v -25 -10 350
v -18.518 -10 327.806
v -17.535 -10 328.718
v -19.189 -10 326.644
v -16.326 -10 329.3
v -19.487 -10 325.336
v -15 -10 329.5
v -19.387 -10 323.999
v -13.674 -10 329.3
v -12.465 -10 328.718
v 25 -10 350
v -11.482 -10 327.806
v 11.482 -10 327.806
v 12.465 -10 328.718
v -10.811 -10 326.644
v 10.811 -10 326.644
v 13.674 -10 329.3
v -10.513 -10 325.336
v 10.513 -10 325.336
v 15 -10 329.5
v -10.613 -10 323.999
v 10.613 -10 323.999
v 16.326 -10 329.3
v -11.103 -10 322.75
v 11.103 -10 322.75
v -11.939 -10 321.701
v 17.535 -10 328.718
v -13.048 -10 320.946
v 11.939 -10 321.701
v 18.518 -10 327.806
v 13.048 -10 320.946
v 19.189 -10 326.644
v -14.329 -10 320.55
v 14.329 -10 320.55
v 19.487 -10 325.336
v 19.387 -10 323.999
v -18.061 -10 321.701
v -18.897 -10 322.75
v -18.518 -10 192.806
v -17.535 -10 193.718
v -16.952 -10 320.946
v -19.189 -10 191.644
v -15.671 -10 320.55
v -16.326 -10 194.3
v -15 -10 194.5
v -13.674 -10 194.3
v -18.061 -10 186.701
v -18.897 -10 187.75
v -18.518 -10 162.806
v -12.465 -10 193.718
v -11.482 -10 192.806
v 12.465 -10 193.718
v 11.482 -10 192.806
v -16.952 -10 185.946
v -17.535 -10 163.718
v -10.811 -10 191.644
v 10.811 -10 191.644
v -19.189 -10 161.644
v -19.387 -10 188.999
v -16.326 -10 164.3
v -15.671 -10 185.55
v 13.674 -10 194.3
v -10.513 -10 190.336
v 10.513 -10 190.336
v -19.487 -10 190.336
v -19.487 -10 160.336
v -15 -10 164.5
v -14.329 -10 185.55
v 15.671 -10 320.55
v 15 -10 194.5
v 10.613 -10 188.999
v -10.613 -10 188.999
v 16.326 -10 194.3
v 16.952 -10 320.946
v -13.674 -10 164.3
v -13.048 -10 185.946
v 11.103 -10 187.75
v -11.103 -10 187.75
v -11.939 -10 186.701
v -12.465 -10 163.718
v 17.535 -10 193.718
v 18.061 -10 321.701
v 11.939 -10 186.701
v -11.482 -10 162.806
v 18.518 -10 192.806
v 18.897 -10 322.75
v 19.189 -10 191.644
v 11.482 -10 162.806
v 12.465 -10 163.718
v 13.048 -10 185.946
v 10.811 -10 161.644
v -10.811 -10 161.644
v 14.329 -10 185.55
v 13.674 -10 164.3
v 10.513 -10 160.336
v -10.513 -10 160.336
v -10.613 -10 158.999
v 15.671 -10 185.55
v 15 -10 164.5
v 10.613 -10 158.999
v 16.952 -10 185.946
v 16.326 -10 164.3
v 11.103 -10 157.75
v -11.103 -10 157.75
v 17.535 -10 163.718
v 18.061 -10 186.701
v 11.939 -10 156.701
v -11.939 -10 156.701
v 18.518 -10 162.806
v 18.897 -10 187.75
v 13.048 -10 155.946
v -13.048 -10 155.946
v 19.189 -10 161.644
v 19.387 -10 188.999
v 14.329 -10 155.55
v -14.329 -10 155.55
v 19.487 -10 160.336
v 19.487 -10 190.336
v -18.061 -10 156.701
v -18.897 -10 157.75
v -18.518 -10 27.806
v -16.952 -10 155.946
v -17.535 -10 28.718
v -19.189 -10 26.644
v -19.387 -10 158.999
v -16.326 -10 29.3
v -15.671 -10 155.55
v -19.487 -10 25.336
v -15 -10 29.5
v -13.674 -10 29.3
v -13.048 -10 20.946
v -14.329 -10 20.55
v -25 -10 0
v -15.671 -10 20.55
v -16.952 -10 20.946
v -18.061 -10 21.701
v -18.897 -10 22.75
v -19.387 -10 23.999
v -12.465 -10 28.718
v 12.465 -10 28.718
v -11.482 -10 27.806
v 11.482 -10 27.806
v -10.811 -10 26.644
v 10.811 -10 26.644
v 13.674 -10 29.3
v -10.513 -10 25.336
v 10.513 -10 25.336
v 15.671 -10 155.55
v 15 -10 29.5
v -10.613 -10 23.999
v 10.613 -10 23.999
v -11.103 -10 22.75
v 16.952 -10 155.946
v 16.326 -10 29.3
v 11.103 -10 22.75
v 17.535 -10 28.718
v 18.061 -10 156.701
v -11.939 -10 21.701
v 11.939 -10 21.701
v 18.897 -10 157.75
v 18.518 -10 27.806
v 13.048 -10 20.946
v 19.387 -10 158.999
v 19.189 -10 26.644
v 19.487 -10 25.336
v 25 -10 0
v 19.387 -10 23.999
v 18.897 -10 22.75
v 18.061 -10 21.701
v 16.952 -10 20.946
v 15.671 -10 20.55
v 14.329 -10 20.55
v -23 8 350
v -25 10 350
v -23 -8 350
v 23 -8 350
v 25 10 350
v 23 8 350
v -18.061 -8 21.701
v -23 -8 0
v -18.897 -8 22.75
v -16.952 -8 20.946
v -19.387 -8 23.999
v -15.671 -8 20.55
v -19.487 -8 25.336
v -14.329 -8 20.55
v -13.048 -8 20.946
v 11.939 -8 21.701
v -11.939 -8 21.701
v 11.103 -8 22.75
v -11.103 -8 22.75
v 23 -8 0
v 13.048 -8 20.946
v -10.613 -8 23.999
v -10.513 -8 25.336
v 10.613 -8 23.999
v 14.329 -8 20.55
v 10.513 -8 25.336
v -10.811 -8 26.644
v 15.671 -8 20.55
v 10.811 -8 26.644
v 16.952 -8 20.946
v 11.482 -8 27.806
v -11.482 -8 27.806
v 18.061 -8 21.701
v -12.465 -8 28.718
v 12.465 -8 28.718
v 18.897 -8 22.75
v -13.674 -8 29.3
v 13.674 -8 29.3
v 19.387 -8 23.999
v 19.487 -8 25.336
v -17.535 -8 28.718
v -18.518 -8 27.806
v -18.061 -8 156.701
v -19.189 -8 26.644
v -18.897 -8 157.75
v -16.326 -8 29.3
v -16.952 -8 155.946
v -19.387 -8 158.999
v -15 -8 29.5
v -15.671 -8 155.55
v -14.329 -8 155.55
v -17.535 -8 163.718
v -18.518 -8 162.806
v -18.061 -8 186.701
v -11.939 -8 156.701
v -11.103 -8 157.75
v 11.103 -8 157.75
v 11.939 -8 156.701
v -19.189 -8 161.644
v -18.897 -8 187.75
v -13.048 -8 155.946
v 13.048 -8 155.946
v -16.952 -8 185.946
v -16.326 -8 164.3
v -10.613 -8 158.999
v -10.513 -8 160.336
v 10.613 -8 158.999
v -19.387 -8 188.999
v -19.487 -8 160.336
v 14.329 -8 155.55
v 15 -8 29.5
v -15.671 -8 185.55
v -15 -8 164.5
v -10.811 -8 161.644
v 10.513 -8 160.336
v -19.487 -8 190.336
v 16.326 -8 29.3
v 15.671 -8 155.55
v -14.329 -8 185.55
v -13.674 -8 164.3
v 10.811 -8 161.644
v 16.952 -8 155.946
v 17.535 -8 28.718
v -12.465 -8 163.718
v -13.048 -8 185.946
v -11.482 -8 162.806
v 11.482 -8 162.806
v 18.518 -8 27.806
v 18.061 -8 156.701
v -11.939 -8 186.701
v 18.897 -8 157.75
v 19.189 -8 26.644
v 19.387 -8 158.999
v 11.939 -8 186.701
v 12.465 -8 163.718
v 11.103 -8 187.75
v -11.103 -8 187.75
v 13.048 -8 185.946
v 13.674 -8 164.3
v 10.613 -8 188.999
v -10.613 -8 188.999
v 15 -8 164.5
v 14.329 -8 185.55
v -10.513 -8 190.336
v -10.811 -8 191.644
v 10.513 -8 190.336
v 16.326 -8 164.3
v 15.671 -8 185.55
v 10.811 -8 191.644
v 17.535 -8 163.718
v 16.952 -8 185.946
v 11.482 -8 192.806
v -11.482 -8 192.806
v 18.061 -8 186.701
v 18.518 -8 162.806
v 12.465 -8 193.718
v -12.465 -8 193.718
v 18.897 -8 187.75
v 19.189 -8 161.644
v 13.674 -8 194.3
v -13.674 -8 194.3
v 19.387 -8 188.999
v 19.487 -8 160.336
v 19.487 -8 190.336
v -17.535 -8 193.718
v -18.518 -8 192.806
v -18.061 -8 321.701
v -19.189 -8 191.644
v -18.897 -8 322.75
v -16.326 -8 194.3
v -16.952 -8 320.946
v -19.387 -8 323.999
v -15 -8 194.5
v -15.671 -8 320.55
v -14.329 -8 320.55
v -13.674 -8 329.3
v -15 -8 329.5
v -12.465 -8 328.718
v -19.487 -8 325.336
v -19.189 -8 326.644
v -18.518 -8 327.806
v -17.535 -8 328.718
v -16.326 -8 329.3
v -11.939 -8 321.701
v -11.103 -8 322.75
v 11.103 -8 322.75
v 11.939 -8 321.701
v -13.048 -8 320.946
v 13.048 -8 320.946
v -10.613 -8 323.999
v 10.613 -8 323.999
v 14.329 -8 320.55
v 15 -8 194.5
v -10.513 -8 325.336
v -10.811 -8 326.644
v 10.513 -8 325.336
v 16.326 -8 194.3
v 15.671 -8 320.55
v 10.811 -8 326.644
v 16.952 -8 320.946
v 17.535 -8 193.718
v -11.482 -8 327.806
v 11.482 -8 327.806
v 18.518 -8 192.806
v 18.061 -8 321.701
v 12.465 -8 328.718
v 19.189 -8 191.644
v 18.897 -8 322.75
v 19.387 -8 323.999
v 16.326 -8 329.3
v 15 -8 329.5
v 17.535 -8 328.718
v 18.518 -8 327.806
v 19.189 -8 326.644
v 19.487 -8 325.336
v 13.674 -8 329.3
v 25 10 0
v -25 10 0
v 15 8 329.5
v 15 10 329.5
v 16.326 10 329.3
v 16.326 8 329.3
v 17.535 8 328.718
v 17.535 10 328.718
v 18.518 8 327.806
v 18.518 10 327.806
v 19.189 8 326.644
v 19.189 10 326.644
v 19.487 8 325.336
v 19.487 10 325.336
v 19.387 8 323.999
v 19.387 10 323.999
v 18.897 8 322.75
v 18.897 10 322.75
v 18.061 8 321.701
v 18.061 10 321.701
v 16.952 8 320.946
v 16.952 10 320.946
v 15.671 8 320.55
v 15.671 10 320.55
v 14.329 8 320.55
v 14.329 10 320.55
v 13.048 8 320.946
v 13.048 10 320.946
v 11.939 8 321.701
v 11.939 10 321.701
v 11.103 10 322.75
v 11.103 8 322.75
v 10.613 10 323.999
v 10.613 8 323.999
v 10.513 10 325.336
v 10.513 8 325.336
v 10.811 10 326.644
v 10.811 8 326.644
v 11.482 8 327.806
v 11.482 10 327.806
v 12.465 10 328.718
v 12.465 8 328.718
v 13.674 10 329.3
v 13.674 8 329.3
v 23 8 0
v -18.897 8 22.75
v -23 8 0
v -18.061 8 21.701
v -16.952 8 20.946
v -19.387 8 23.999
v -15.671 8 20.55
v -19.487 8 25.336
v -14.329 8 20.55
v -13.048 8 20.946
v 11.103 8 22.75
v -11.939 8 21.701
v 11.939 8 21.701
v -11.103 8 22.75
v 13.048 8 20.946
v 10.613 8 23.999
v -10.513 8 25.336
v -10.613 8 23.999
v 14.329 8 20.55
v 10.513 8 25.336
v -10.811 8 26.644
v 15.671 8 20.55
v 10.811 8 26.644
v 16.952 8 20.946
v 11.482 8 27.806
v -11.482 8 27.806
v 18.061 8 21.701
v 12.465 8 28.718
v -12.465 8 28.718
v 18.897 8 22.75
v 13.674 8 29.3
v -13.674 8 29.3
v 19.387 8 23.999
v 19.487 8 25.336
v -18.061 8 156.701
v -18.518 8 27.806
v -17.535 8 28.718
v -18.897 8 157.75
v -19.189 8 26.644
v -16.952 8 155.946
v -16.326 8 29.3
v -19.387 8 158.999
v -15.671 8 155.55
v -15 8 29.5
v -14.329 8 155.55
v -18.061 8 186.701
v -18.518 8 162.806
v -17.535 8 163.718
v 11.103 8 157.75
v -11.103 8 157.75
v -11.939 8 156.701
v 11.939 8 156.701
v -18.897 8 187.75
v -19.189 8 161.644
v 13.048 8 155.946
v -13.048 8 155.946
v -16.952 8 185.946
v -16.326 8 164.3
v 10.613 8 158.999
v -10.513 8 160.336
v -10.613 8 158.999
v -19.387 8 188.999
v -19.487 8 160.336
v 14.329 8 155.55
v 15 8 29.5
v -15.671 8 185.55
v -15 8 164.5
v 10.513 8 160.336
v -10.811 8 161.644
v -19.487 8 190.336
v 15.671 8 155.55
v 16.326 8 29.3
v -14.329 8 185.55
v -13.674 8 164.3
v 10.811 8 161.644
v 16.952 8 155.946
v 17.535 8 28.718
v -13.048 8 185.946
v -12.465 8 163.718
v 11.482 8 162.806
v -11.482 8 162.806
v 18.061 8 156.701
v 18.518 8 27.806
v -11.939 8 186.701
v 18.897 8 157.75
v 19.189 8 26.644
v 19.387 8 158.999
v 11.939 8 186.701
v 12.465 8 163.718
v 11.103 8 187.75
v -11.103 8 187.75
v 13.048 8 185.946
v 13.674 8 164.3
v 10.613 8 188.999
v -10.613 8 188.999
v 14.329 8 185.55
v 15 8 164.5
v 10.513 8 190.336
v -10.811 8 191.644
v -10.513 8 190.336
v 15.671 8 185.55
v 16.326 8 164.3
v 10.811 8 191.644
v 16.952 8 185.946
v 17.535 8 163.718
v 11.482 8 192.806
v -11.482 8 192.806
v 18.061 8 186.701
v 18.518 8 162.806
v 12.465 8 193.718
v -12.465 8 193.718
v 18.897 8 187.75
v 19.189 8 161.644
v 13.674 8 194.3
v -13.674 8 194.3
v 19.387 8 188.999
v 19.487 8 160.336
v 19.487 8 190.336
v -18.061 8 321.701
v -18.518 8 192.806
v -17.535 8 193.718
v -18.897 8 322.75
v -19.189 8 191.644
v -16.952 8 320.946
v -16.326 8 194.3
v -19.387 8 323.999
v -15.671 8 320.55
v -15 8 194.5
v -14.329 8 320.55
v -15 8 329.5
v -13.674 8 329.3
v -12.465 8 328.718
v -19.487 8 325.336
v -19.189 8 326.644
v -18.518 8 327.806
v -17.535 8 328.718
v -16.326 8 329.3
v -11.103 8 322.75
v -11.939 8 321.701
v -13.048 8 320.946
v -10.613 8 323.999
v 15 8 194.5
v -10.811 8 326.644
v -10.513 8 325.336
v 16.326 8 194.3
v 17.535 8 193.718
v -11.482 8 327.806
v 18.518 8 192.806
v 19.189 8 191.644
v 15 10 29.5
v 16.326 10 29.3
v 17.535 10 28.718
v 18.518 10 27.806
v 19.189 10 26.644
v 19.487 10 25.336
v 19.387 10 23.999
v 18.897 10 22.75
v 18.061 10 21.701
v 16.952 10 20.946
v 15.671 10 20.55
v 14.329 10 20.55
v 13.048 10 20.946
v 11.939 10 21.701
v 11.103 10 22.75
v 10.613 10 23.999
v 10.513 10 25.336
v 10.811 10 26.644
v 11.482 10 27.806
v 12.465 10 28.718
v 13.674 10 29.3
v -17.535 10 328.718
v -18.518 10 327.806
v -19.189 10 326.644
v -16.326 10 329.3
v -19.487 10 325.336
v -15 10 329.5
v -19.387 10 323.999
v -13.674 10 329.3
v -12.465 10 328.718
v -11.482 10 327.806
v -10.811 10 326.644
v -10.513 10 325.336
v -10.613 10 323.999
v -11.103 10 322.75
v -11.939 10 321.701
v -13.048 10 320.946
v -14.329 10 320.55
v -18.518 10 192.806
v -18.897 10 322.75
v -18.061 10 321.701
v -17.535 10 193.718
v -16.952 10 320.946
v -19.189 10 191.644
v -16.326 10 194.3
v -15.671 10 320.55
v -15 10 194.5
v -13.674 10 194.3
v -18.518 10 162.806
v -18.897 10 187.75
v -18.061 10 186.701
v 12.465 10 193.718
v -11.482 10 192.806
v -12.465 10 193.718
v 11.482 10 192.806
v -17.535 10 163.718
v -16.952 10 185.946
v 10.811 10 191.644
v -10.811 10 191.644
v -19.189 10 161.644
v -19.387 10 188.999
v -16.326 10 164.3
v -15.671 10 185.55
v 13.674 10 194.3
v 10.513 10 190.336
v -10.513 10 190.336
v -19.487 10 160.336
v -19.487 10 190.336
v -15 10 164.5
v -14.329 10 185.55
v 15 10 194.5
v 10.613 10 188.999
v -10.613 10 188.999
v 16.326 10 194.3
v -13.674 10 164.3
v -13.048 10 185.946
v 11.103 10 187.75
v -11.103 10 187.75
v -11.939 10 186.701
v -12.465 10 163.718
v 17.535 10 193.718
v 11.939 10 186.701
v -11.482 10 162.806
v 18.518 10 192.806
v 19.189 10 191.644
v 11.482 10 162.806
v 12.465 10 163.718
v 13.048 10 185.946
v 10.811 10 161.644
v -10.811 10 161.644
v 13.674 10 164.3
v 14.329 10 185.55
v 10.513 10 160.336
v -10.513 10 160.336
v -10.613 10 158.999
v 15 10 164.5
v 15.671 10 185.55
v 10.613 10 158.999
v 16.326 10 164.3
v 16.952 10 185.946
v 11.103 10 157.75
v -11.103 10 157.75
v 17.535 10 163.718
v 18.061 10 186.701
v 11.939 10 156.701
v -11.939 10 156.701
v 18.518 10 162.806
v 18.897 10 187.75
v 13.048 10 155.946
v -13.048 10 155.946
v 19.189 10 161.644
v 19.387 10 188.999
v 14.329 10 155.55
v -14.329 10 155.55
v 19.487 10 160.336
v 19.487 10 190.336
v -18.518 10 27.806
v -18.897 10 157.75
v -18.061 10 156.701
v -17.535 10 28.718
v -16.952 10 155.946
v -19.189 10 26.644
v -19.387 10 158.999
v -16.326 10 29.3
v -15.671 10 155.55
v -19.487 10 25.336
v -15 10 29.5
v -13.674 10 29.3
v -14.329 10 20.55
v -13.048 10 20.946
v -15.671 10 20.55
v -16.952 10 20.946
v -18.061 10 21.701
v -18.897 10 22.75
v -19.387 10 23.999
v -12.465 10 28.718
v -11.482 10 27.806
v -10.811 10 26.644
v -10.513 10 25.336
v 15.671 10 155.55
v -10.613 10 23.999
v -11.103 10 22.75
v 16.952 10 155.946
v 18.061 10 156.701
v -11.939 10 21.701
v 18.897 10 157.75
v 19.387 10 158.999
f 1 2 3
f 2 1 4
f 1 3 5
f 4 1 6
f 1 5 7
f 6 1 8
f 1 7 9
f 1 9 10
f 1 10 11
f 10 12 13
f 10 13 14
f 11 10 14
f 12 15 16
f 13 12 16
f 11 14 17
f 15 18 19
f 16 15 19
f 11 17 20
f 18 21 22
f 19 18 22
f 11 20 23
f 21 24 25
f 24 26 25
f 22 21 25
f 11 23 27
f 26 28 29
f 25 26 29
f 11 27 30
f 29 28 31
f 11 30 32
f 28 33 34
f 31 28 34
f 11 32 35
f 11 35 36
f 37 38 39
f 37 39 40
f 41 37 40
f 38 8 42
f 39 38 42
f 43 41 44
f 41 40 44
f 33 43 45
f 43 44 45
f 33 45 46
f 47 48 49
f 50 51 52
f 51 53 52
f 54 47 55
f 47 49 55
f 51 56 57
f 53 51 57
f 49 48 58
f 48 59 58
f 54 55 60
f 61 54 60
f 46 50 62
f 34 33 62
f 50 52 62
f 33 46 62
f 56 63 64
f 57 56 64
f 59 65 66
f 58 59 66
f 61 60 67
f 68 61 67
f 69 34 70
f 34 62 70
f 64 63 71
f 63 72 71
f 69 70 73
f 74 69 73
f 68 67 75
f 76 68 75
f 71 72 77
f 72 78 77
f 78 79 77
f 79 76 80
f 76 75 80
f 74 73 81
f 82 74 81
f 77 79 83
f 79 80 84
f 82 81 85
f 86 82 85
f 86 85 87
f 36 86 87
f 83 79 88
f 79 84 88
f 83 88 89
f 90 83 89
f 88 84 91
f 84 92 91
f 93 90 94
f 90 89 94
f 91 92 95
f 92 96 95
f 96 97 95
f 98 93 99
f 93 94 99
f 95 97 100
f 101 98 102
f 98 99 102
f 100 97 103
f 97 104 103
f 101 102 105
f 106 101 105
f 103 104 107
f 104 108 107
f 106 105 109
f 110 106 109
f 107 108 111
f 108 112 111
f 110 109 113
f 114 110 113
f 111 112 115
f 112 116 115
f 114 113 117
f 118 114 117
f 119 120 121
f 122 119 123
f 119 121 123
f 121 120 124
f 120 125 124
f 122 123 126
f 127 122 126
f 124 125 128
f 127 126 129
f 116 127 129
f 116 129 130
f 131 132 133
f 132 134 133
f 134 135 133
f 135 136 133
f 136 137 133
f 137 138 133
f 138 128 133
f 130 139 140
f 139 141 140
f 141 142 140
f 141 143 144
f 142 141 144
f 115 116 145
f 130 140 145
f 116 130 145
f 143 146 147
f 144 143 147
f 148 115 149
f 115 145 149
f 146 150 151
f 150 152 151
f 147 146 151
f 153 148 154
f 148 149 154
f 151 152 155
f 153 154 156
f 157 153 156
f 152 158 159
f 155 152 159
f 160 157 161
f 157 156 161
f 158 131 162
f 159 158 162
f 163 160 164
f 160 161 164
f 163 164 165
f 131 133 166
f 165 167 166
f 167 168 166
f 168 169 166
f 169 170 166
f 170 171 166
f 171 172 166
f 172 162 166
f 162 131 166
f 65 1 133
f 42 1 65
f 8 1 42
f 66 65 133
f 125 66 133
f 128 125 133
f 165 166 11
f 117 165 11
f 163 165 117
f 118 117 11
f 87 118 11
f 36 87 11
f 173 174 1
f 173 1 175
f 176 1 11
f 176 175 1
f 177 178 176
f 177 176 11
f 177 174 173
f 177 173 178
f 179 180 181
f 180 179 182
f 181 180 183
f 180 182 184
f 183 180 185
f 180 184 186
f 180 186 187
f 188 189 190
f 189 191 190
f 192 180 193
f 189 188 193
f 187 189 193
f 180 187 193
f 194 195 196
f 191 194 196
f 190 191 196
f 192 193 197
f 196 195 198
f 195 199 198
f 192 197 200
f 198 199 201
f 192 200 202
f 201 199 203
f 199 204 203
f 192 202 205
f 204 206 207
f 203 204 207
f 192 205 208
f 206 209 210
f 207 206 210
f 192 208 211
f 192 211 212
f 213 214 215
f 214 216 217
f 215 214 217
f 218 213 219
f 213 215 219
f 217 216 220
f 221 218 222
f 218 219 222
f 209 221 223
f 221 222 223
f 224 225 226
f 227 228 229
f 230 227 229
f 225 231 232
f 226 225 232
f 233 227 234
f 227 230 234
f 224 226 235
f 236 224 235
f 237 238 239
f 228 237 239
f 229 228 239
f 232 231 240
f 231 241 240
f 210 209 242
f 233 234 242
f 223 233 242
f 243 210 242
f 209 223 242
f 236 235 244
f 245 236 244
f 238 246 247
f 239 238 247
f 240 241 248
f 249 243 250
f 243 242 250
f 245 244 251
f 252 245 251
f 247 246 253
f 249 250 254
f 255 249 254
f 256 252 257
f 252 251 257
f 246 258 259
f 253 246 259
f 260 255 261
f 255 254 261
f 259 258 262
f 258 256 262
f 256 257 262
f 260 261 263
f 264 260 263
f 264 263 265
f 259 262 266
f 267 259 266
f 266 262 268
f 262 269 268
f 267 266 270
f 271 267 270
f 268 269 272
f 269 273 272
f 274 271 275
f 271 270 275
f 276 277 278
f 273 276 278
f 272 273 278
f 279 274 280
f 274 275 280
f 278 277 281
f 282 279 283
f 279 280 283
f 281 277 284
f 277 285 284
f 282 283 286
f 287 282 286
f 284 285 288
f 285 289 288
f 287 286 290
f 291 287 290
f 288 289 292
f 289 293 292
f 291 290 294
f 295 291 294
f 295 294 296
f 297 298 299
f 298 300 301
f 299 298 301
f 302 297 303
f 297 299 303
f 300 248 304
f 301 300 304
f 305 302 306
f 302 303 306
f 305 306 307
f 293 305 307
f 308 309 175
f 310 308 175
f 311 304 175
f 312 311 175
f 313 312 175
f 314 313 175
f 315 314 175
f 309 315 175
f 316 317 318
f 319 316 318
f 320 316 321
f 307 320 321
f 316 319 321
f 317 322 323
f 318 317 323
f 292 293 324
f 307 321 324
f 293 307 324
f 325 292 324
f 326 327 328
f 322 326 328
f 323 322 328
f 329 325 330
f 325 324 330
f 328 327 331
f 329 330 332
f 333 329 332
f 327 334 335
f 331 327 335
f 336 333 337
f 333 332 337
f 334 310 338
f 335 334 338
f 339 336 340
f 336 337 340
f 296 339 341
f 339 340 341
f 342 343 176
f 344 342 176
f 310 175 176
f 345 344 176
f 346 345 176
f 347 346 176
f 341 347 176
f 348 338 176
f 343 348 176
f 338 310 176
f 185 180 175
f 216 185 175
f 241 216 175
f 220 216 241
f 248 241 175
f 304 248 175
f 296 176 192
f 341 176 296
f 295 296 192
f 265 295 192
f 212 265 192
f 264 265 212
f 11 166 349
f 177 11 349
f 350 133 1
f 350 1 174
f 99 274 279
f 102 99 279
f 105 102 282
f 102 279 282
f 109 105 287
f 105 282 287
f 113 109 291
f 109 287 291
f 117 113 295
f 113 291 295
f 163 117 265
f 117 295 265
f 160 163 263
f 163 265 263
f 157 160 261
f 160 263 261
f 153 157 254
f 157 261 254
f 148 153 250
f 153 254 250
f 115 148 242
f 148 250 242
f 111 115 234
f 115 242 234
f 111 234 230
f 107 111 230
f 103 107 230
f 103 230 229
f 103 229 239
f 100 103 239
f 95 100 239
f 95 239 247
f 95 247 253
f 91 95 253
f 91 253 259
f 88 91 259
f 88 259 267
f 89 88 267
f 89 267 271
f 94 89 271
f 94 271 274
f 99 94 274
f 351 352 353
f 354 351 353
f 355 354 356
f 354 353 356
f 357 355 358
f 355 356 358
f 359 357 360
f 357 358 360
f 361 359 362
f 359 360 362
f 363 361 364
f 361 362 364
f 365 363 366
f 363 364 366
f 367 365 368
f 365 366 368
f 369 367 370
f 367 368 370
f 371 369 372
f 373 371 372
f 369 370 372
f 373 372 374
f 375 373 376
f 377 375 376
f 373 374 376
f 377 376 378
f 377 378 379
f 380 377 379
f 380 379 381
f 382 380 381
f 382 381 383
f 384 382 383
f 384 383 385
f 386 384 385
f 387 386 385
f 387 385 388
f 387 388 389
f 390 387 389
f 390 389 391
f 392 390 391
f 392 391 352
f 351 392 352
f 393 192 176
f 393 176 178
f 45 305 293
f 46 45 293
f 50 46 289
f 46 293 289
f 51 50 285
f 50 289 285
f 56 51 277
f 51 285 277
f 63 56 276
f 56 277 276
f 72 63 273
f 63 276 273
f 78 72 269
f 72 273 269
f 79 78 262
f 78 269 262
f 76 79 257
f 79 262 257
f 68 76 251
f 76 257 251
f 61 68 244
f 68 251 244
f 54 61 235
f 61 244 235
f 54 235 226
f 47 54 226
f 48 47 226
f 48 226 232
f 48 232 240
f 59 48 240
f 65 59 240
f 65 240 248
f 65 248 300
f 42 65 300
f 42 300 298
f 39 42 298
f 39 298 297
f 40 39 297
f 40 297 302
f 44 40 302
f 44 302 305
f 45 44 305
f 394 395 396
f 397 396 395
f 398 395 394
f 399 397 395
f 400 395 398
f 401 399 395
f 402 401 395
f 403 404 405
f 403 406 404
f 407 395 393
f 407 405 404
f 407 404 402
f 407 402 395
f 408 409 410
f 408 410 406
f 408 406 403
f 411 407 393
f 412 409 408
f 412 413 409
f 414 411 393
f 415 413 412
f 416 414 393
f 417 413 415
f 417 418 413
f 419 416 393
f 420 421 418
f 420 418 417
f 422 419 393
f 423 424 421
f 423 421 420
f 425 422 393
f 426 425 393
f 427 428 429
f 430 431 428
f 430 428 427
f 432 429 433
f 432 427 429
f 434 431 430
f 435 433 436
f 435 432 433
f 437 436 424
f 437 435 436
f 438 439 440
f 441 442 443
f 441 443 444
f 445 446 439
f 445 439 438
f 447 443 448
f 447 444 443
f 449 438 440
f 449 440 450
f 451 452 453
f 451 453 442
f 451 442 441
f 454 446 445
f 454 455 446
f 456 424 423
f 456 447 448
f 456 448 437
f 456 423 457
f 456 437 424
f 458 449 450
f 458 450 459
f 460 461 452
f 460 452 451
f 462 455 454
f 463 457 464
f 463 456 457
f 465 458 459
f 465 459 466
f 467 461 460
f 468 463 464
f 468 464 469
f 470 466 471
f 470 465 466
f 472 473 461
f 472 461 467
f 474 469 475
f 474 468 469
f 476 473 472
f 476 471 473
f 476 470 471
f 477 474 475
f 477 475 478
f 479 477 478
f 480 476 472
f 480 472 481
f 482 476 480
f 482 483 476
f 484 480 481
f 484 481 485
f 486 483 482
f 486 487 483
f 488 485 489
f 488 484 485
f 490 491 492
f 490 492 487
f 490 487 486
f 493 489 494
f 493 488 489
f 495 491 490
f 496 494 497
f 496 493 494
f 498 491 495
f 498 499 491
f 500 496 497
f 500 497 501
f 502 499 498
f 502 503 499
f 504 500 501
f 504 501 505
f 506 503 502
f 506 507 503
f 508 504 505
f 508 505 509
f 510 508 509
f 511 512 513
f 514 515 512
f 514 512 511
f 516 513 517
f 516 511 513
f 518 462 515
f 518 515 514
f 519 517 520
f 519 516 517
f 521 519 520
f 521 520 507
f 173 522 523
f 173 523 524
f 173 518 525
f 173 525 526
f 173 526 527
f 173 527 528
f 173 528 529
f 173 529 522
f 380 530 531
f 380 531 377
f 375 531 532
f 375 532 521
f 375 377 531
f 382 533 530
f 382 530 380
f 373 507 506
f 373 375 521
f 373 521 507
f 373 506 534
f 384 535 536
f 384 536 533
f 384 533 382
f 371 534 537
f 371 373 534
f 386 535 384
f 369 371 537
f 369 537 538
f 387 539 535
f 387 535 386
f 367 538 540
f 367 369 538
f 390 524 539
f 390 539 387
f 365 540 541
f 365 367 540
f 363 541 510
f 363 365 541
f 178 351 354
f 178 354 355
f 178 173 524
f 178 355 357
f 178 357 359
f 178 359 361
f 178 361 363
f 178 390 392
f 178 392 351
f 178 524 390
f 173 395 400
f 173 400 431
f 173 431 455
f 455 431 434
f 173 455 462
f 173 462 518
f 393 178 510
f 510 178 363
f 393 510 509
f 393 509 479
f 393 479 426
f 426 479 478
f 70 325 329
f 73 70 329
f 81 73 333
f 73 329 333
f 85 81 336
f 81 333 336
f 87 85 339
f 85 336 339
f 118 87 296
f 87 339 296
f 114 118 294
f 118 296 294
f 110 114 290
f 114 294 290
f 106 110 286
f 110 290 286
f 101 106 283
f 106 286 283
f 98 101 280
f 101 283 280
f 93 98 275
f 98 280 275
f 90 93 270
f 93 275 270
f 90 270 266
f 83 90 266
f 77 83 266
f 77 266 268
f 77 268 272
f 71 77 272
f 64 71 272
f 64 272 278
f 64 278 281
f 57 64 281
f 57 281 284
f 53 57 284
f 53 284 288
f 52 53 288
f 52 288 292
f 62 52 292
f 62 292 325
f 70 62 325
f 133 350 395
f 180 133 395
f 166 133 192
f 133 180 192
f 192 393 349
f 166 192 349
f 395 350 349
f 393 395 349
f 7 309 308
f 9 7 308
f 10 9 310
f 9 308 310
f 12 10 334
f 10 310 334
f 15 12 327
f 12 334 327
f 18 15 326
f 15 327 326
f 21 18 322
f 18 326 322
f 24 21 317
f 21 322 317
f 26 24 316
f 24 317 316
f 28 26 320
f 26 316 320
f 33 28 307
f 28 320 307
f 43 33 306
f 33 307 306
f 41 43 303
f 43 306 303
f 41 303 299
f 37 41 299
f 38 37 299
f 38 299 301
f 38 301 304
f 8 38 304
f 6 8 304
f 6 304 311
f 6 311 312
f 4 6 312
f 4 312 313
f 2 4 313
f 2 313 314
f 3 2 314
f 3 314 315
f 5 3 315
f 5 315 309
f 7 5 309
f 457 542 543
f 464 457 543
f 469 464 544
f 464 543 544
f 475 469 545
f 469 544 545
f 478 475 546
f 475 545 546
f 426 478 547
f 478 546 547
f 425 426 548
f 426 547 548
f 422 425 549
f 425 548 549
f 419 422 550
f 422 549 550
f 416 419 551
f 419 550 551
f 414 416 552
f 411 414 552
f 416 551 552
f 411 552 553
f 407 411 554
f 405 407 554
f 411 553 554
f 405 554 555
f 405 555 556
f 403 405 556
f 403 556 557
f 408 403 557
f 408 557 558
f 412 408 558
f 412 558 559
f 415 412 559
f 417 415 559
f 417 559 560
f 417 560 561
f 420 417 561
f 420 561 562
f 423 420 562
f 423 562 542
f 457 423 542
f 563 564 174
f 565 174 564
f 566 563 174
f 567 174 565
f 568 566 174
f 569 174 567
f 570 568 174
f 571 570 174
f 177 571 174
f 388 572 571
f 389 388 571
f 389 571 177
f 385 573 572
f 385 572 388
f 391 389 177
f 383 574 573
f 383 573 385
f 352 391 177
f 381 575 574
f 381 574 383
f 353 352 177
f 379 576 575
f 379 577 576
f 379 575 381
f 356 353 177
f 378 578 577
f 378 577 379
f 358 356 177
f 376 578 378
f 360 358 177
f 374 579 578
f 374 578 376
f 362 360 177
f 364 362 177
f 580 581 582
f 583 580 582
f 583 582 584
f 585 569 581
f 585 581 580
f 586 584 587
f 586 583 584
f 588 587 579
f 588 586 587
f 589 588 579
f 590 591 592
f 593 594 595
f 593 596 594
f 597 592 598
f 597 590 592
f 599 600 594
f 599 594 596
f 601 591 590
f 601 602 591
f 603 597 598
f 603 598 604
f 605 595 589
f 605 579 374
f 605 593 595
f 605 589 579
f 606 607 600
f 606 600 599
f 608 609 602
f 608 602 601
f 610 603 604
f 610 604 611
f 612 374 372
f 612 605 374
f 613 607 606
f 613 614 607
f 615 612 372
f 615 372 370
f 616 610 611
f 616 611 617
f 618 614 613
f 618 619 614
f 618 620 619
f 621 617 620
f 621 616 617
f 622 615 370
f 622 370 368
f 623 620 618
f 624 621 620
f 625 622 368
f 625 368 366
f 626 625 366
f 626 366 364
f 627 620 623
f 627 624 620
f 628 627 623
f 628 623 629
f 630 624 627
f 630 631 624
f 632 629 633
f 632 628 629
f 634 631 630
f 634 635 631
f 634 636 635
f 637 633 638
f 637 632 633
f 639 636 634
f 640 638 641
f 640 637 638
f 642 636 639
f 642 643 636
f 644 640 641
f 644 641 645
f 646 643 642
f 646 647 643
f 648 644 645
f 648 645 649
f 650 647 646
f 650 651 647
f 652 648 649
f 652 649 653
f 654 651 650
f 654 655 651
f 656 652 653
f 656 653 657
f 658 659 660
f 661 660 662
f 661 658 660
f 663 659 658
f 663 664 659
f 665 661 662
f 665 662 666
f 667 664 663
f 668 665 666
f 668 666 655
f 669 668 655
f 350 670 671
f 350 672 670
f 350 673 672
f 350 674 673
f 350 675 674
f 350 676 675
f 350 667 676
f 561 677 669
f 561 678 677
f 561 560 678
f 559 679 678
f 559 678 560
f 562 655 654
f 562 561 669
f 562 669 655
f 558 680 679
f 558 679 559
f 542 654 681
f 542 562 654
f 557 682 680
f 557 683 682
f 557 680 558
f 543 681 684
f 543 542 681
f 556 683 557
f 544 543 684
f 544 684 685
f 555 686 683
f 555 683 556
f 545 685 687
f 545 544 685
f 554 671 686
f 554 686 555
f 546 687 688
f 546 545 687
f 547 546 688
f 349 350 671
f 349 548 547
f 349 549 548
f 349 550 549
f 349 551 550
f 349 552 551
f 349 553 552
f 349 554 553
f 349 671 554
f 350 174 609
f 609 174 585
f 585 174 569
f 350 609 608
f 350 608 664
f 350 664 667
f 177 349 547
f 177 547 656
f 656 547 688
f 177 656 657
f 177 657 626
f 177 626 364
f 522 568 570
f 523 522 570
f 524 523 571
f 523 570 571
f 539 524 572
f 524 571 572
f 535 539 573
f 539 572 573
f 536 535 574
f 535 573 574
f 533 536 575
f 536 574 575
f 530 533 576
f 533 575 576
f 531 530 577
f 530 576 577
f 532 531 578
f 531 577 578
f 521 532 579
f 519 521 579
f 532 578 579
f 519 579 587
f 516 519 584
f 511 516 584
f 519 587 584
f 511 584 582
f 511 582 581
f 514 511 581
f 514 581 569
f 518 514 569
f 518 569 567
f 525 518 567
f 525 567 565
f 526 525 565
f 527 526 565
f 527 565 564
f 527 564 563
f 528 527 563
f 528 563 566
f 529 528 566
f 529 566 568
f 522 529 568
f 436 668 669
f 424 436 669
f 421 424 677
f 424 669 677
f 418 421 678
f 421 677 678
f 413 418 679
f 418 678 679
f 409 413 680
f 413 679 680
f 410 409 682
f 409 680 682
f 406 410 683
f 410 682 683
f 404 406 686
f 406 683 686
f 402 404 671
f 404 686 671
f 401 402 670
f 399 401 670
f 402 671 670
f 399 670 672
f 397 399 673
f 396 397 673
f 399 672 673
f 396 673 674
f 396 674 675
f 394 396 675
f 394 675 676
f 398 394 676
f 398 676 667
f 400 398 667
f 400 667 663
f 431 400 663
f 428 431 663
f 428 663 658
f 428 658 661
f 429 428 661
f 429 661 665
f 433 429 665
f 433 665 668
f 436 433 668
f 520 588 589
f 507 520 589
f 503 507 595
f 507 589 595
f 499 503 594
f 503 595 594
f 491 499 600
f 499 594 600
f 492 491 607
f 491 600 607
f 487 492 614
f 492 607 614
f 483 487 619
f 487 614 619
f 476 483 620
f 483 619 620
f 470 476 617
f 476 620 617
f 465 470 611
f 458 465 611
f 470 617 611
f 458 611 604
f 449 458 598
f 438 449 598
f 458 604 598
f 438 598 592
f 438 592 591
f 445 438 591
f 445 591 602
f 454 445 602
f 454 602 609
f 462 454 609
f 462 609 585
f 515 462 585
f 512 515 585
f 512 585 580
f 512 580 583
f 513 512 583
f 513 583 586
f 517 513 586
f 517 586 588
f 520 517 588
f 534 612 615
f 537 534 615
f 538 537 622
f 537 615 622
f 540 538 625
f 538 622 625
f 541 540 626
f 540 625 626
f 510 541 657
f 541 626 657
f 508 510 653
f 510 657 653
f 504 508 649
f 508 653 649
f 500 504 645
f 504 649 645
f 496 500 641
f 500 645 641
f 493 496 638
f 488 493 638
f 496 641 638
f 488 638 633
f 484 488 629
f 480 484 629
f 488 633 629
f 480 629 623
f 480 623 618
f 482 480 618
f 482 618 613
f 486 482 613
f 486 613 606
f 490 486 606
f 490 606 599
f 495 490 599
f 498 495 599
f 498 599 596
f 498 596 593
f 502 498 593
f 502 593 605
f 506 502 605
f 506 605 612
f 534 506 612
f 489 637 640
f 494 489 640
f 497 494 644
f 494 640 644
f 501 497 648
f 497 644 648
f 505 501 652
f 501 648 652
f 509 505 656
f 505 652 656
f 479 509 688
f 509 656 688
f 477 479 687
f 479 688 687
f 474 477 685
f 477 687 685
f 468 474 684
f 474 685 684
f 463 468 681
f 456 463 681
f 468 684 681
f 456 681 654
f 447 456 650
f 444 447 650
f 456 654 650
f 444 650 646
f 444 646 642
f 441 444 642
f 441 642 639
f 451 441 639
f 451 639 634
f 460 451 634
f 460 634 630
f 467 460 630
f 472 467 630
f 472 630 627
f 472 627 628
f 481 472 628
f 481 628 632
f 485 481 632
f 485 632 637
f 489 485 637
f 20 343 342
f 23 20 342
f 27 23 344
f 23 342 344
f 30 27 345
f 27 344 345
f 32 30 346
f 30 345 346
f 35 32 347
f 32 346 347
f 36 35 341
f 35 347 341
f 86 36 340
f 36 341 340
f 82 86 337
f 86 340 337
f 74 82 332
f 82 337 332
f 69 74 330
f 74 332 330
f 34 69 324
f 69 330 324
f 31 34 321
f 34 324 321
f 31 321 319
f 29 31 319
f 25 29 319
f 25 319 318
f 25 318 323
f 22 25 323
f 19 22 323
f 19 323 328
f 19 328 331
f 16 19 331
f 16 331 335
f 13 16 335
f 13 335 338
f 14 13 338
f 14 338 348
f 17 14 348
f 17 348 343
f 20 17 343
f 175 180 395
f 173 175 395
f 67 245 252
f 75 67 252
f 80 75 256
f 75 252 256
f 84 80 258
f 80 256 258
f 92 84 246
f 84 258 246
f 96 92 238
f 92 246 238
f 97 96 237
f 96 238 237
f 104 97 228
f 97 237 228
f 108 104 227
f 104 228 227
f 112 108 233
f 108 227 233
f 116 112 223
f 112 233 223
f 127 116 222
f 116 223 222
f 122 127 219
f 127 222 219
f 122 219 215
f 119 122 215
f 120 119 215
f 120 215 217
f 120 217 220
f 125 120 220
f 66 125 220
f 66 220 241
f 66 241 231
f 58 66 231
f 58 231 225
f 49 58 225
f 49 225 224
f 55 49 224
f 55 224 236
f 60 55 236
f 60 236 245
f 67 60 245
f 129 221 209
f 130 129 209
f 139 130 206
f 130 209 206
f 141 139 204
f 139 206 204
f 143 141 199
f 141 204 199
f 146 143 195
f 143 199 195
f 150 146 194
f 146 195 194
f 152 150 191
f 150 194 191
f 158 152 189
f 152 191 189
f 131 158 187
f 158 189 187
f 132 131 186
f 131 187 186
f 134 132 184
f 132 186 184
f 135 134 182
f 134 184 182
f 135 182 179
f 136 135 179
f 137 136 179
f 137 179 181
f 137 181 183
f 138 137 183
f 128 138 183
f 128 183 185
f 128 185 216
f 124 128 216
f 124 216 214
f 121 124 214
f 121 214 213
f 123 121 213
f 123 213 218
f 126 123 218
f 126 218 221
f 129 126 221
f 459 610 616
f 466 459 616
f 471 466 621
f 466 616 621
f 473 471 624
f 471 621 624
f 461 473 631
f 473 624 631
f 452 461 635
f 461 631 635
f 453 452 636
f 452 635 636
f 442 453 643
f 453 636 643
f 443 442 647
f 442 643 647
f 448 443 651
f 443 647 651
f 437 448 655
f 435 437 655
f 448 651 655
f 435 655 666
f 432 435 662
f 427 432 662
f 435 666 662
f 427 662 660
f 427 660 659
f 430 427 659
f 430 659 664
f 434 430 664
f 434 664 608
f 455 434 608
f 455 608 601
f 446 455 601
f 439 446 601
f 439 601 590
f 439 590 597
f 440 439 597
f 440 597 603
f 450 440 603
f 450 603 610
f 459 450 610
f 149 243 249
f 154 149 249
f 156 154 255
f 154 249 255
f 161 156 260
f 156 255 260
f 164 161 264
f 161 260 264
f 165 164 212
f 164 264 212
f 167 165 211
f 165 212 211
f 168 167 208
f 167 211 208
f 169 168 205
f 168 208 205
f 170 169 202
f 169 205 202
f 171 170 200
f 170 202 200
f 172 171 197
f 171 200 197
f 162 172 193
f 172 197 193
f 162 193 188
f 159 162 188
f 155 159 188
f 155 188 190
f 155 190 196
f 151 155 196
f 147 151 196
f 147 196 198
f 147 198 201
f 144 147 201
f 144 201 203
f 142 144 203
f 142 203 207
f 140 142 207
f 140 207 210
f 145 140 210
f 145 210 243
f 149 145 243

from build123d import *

# Parameters (mm, degrees)
SKETCH_1_W          = 50
SKETCH_1_H          = 20
EXTRUDE_1_DEPTH     = 350
SKETCH_2_W          = 46
SKETCH_2_H          = 16
CUT_EXTRUDE_1_DEPTH = 352.034186369
SKETCH_3_R          = 4.5
CUT_EXTRUDE_3_DEPTH = 352.461235416


with BuildPart() as part:
    # Эскиз1 → Бобышка-Вытянуть1 (new body)
    with BuildSketch(Plane.XY):
        Rectangle(SKETCH_1_W, SKETCH_1_H)
    extrude(amount=EXTRUDE_1_DEPTH)

    # Эскиз2 → Вырез-Вытянуть1 (cut, through all)
    with BuildSketch(Plane.XY.offset(350)):
        Rectangle(SKETCH_2_W, SKETCH_2_H)
    extrude(amount=-CUT_EXTRUDE_1_DEPTH, mode=Mode.SUBTRACT)

    # Эскиз3 → Вырез-Вытянуть3 (cut, through all)
    with BuildSketch(Plane(origin=(0, 10, 0), x_dir=(-1, 0, 0), z_dir=(0, 1, 0))):
        with Locations(Location((-15, 325, 0), (0, 0, 90))):
            Circle(SKETCH_3_R)
        with Locations(Location((15, 325, 0), (0, 0, 90))):
            Circle(SKETCH_3_R)
        with Locations(Location((-15, 25, 0), (0, 0, 90))):
            Circle(SKETCH_3_R)
        with Locations(Location((15, 25, 0), (0, 0, 90))):
            Circle(SKETCH_3_R)
        with Locations(Location((-15, 160, 0), (0, 0, 90))):
            Circle(SKETCH_3_R)
        with Locations(Location((-15, 190, 0), (0, 0, 90))):
            Circle(SKETCH_3_R)
        with Locations(Location((15, 190, 0), (0, 0, 90))):
            Circle(SKETCH_3_R)
        with Locations(Location((15, 160, 0), (0, 0, 90))):
            Circle(SKETCH_3_R)
    extrude(amount=-CUT_EXTRUDE_3_DEPTH, mode=Mode.SUBTRACT)


solid = part.part
